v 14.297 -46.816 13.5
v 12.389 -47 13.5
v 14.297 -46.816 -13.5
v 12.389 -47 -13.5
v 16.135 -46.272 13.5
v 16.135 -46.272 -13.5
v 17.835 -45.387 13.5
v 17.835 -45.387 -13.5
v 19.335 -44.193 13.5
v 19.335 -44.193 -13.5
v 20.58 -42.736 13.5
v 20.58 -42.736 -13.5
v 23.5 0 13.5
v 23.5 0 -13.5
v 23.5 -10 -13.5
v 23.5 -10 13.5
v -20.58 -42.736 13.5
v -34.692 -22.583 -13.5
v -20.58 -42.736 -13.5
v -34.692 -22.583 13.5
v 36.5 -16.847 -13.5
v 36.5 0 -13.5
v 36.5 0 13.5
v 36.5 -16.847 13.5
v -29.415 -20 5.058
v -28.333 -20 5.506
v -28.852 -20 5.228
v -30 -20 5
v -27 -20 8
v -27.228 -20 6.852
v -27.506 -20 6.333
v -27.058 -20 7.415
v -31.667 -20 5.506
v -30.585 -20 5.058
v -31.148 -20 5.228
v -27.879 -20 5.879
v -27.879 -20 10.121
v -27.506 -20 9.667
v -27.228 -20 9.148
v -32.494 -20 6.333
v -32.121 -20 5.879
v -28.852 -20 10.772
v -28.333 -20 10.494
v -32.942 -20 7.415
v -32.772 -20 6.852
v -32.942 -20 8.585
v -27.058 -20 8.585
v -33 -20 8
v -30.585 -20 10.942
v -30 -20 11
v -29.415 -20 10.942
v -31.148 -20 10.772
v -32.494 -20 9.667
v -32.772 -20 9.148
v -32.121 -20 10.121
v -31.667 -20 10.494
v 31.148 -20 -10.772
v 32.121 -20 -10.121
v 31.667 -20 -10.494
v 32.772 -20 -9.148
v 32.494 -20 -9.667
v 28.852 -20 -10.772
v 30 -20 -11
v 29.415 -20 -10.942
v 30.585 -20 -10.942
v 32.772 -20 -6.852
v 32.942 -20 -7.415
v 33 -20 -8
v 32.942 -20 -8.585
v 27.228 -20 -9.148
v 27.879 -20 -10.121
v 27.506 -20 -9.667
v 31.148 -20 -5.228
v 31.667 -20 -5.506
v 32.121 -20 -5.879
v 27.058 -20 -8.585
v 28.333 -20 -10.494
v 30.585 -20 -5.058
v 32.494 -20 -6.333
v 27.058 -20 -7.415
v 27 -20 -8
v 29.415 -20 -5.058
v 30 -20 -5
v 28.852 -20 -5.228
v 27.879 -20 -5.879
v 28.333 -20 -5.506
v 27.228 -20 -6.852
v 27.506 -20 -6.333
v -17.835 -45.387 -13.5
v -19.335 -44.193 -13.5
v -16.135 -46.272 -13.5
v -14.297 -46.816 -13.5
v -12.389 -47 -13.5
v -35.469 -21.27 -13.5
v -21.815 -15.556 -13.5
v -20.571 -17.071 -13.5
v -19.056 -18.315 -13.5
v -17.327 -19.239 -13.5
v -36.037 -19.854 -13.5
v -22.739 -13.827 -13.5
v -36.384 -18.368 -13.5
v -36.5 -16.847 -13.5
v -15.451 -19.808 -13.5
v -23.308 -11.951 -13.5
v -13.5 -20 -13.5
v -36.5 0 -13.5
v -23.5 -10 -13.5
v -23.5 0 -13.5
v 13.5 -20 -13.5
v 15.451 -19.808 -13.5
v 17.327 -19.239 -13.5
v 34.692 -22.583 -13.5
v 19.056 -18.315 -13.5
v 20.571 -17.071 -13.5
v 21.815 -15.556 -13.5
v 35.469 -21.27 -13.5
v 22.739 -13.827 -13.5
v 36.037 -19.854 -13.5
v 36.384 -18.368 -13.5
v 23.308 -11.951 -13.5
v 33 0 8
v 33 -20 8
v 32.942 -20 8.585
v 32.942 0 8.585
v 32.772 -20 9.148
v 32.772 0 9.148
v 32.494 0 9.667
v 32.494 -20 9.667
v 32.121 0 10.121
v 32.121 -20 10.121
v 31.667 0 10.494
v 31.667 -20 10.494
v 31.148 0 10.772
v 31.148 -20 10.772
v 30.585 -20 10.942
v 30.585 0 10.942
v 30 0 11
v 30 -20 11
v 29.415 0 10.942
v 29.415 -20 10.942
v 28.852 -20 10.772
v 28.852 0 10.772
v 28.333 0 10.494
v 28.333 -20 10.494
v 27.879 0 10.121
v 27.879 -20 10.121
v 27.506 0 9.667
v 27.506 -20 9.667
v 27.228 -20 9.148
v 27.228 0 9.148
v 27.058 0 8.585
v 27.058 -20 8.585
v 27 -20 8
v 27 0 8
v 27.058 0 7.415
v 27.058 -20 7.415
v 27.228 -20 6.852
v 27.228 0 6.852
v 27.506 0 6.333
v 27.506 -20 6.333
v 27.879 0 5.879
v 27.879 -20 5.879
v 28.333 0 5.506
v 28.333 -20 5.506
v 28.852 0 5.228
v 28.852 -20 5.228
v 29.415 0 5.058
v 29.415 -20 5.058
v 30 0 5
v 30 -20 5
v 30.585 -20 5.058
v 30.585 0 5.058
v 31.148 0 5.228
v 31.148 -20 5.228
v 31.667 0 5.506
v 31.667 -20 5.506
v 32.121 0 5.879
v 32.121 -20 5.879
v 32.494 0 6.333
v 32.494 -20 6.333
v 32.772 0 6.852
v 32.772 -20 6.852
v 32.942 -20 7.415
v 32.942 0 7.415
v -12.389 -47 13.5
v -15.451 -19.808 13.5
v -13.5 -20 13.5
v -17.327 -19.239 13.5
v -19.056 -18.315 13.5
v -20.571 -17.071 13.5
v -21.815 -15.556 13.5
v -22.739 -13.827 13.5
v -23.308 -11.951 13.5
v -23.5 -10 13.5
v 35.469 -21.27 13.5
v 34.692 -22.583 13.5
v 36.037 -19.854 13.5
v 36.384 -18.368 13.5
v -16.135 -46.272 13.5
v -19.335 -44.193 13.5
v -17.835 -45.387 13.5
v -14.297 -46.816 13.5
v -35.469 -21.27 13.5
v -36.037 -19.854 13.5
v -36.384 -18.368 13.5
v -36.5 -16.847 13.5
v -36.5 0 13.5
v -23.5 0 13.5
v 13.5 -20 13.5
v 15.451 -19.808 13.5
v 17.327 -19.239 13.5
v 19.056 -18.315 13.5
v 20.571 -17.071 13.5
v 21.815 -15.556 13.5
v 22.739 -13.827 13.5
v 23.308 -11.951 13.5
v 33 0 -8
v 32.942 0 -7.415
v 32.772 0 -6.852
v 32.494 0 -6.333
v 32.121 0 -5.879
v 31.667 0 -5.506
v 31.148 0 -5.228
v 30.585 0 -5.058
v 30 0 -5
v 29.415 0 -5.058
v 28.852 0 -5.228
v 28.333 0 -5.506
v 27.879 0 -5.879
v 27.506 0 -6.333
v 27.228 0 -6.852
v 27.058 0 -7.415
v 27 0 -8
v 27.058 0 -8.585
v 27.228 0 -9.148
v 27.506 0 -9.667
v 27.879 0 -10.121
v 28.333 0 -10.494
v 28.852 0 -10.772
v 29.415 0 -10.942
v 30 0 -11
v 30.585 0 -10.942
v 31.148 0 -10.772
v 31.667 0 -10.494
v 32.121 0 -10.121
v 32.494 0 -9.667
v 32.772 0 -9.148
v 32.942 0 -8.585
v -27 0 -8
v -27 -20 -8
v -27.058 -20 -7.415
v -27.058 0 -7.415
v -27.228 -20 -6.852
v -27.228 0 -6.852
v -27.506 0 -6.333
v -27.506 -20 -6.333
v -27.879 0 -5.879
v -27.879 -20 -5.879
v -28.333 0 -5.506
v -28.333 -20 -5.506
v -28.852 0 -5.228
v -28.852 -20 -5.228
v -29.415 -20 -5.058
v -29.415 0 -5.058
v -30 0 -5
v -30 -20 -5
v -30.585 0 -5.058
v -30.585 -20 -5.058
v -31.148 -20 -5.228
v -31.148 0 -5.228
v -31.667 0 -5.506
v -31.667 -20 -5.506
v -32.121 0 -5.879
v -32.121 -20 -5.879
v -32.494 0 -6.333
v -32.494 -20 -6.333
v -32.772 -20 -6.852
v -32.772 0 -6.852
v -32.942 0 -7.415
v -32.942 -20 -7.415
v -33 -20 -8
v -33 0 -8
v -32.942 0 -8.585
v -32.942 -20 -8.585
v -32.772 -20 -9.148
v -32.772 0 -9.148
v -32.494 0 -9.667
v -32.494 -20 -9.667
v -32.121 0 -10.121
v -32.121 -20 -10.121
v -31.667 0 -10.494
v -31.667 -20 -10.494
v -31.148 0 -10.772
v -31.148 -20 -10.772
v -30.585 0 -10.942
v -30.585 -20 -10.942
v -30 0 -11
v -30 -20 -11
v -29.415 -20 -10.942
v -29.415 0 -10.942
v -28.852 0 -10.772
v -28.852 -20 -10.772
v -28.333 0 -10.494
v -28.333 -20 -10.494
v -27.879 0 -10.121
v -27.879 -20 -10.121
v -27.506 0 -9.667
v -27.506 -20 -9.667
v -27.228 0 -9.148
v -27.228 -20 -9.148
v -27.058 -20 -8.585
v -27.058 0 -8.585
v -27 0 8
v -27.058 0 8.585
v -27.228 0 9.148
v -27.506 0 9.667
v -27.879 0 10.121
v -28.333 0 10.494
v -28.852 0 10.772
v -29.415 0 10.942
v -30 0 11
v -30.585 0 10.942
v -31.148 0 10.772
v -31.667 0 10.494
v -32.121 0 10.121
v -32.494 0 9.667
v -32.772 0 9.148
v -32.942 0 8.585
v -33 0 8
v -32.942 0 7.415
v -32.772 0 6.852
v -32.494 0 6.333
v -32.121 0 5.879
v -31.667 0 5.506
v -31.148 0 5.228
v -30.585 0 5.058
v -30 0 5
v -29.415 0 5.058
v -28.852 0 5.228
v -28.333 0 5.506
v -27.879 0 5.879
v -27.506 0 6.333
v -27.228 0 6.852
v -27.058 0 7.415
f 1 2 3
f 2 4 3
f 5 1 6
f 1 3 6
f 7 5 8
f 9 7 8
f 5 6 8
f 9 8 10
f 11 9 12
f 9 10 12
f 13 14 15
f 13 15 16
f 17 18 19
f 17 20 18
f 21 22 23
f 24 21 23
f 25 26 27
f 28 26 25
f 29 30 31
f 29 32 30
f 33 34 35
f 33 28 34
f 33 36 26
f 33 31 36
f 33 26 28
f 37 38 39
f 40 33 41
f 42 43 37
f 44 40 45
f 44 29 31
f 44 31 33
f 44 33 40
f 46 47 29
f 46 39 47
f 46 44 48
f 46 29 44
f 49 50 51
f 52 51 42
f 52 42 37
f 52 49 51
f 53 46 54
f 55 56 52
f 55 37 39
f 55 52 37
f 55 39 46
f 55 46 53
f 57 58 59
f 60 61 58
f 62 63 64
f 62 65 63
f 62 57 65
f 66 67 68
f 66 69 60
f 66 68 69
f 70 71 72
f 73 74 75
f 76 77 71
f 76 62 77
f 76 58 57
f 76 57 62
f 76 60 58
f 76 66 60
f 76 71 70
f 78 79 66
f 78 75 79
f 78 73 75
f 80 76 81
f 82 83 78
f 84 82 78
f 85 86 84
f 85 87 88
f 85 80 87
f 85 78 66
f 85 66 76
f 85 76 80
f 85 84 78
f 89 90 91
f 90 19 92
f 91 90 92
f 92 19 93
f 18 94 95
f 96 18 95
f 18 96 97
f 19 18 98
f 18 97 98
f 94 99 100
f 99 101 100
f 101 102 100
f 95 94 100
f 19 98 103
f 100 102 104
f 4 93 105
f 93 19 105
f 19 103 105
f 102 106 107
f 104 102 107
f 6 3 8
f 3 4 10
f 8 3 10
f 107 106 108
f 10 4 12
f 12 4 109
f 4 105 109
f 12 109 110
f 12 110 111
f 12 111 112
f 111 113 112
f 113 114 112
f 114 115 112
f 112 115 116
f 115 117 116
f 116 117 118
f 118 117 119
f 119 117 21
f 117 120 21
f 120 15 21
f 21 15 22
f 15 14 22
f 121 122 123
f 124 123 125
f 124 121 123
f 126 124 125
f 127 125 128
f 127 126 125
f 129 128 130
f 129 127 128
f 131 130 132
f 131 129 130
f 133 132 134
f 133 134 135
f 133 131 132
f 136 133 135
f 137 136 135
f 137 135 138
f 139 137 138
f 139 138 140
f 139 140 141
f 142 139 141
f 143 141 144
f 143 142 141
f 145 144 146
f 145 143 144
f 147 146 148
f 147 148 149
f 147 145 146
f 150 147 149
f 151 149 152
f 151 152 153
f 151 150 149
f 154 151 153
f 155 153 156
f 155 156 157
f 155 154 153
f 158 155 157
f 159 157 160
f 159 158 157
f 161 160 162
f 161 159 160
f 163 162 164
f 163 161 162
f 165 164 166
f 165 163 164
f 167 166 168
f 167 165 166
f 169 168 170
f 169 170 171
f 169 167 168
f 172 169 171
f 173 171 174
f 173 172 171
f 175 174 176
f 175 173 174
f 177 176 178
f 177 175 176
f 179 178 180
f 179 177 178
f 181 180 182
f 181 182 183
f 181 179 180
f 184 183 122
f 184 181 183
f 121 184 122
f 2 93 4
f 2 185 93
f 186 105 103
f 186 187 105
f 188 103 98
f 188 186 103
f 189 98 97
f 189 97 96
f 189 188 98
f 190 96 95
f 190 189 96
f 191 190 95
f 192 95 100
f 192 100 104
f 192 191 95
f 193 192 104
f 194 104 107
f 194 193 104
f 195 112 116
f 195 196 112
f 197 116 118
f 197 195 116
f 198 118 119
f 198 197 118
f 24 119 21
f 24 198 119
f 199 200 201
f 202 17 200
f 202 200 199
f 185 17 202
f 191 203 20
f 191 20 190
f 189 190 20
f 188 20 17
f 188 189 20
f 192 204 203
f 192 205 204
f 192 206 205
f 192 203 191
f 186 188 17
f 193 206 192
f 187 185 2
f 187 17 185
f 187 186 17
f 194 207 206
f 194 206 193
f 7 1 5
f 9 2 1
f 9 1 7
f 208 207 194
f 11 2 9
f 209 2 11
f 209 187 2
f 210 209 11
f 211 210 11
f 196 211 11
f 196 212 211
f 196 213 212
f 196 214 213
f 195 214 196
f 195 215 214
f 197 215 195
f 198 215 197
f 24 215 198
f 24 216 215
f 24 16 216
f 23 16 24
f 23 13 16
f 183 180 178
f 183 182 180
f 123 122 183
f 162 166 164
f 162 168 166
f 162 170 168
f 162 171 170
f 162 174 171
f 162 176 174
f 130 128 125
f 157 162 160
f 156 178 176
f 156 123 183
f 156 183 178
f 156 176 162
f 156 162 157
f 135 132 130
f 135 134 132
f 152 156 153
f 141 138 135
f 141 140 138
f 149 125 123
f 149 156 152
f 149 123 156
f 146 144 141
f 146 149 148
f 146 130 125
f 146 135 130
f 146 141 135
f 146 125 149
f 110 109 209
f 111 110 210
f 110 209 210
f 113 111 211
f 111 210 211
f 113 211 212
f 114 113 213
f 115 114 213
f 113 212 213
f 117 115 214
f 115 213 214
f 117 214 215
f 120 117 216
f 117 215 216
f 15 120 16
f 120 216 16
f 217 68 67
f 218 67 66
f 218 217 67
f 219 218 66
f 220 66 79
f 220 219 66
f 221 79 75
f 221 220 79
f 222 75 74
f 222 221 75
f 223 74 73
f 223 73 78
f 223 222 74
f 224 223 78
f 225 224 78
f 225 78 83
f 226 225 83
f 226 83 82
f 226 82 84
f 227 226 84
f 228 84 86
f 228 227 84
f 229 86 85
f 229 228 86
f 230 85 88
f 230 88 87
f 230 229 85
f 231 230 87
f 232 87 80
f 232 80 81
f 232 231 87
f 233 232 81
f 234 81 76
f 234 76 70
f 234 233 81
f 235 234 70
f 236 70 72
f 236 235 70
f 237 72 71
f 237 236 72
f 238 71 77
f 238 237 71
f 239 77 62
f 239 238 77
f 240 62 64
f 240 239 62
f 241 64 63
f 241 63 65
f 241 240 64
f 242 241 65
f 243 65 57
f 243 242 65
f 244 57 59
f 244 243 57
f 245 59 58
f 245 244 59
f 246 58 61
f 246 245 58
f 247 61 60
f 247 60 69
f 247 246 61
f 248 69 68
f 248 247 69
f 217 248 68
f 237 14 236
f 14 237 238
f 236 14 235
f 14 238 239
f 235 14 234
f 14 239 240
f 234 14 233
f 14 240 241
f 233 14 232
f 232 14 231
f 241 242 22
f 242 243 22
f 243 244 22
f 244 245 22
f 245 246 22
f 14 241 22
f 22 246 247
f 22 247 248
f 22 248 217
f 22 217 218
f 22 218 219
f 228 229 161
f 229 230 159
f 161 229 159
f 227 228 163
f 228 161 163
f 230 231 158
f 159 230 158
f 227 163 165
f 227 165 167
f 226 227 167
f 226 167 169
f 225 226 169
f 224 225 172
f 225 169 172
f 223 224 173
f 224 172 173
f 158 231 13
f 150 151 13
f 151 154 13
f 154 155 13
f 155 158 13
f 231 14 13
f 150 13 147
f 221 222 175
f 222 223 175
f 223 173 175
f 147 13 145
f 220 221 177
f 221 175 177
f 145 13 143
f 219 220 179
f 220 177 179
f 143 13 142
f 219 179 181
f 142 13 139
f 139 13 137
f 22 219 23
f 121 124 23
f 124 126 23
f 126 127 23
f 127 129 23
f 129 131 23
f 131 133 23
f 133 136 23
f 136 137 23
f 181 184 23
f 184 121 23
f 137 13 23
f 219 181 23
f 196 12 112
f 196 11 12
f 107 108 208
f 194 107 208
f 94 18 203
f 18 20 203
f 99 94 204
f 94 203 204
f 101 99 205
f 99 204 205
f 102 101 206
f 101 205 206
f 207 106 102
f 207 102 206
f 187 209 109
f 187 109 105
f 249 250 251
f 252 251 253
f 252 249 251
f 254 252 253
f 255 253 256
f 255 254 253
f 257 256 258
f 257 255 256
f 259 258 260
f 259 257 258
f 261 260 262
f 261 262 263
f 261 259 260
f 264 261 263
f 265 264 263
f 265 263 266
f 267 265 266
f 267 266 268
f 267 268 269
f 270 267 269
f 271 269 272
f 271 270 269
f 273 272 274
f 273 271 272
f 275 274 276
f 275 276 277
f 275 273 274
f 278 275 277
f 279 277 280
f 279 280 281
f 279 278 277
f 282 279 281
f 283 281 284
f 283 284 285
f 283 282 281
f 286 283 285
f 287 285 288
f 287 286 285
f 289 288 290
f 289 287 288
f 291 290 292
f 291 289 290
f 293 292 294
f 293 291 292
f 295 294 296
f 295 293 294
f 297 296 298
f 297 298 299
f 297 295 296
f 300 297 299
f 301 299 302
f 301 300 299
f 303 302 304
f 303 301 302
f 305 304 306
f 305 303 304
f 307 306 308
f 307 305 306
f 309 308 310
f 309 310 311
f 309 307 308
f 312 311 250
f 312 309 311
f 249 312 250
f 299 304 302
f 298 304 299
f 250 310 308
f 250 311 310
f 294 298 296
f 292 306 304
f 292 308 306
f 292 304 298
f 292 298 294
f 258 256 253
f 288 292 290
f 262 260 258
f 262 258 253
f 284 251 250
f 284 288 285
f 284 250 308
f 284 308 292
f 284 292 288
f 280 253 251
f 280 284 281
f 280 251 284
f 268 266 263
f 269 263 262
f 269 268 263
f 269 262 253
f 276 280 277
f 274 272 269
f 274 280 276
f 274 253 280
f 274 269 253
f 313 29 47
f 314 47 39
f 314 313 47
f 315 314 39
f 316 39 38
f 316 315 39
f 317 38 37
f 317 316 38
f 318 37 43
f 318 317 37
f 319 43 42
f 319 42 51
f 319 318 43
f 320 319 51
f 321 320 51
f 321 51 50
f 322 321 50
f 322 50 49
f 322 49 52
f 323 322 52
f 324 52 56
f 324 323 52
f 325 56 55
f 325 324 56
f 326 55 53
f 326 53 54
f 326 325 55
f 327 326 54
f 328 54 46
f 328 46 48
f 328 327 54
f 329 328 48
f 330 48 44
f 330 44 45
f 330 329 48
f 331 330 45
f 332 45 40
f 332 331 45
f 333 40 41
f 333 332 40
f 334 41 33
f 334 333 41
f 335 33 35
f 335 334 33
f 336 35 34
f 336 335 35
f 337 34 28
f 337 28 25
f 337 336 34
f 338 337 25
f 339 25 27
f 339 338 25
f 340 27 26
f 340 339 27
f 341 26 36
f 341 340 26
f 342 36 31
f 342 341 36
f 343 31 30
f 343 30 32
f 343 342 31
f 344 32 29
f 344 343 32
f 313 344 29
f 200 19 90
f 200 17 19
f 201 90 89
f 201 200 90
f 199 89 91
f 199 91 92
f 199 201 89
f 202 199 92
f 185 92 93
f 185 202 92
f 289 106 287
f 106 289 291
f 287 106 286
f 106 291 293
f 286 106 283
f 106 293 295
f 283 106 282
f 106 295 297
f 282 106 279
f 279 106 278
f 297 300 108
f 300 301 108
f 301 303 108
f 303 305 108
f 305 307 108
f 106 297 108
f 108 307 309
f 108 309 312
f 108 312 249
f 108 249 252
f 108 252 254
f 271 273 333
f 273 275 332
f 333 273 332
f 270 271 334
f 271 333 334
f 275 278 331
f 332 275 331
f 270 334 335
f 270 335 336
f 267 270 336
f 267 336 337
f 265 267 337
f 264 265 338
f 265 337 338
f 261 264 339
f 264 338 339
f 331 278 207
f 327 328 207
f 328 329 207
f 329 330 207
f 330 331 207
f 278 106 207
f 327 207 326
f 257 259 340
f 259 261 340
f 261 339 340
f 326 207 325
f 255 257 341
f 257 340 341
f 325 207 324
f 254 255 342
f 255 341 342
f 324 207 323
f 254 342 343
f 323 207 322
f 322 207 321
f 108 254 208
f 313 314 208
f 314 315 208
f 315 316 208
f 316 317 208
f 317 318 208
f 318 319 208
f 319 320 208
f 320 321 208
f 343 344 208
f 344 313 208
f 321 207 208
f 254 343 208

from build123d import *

# Parameters (mm, degrees)
F0_W     = 13
F0_H     = 27
F0_R     = 3
F1_DEPTH = 20
F3_DEPTH = 13.5
F4_R     = 10


with BuildPart() as f1:
    # F0 (on Front) → F1 (new body)
    with BuildSketch(Plane.XZ):
        with Locations((-30, 0)):
            Rectangle(F0_W, F0_H)
        with Locations((-30, -8)):
            Circle(F0_R, mode=Mode.SUBTRACT)
        with Locations((-30, 8)):
            Circle(F0_R, mode=Mode.SUBTRACT)
        with Locations((30, 0)):
            Rectangle(F0_W, F0_H)
        with Locations((30, -8)):
            Circle(F0_R, mode=Mode.SUBTRACT)
        with Locations((30, 8)):
            Circle(F0_R, mode=Mode.SUBTRACT)
    extrude(amount=F1_DEPTH)

    # F2 (on Top) → F3 (join, symmetric)
    with BuildSketch(Plane.XY):
        Polygon((36.5, -20), (-36.5, -20), (-17.594396, -47), (17.594396, -47), align=None)
    extrude(amount=F3_DEPTH, both=True)

    # F4
    f4_edges = [f1.edges().sort_by_distance(p)[0] for p in [
        (-23.5, -20, 0),
        (23.5, -20, 0),
        (-17.594396, -47, 0),
        (17.594396, -47, 0),
        (-36.5, -20, 0),
        (36.5, -20, 0),
    ]]
    fillet(f4_edges, radius=F4_R)


solid = f1.part
